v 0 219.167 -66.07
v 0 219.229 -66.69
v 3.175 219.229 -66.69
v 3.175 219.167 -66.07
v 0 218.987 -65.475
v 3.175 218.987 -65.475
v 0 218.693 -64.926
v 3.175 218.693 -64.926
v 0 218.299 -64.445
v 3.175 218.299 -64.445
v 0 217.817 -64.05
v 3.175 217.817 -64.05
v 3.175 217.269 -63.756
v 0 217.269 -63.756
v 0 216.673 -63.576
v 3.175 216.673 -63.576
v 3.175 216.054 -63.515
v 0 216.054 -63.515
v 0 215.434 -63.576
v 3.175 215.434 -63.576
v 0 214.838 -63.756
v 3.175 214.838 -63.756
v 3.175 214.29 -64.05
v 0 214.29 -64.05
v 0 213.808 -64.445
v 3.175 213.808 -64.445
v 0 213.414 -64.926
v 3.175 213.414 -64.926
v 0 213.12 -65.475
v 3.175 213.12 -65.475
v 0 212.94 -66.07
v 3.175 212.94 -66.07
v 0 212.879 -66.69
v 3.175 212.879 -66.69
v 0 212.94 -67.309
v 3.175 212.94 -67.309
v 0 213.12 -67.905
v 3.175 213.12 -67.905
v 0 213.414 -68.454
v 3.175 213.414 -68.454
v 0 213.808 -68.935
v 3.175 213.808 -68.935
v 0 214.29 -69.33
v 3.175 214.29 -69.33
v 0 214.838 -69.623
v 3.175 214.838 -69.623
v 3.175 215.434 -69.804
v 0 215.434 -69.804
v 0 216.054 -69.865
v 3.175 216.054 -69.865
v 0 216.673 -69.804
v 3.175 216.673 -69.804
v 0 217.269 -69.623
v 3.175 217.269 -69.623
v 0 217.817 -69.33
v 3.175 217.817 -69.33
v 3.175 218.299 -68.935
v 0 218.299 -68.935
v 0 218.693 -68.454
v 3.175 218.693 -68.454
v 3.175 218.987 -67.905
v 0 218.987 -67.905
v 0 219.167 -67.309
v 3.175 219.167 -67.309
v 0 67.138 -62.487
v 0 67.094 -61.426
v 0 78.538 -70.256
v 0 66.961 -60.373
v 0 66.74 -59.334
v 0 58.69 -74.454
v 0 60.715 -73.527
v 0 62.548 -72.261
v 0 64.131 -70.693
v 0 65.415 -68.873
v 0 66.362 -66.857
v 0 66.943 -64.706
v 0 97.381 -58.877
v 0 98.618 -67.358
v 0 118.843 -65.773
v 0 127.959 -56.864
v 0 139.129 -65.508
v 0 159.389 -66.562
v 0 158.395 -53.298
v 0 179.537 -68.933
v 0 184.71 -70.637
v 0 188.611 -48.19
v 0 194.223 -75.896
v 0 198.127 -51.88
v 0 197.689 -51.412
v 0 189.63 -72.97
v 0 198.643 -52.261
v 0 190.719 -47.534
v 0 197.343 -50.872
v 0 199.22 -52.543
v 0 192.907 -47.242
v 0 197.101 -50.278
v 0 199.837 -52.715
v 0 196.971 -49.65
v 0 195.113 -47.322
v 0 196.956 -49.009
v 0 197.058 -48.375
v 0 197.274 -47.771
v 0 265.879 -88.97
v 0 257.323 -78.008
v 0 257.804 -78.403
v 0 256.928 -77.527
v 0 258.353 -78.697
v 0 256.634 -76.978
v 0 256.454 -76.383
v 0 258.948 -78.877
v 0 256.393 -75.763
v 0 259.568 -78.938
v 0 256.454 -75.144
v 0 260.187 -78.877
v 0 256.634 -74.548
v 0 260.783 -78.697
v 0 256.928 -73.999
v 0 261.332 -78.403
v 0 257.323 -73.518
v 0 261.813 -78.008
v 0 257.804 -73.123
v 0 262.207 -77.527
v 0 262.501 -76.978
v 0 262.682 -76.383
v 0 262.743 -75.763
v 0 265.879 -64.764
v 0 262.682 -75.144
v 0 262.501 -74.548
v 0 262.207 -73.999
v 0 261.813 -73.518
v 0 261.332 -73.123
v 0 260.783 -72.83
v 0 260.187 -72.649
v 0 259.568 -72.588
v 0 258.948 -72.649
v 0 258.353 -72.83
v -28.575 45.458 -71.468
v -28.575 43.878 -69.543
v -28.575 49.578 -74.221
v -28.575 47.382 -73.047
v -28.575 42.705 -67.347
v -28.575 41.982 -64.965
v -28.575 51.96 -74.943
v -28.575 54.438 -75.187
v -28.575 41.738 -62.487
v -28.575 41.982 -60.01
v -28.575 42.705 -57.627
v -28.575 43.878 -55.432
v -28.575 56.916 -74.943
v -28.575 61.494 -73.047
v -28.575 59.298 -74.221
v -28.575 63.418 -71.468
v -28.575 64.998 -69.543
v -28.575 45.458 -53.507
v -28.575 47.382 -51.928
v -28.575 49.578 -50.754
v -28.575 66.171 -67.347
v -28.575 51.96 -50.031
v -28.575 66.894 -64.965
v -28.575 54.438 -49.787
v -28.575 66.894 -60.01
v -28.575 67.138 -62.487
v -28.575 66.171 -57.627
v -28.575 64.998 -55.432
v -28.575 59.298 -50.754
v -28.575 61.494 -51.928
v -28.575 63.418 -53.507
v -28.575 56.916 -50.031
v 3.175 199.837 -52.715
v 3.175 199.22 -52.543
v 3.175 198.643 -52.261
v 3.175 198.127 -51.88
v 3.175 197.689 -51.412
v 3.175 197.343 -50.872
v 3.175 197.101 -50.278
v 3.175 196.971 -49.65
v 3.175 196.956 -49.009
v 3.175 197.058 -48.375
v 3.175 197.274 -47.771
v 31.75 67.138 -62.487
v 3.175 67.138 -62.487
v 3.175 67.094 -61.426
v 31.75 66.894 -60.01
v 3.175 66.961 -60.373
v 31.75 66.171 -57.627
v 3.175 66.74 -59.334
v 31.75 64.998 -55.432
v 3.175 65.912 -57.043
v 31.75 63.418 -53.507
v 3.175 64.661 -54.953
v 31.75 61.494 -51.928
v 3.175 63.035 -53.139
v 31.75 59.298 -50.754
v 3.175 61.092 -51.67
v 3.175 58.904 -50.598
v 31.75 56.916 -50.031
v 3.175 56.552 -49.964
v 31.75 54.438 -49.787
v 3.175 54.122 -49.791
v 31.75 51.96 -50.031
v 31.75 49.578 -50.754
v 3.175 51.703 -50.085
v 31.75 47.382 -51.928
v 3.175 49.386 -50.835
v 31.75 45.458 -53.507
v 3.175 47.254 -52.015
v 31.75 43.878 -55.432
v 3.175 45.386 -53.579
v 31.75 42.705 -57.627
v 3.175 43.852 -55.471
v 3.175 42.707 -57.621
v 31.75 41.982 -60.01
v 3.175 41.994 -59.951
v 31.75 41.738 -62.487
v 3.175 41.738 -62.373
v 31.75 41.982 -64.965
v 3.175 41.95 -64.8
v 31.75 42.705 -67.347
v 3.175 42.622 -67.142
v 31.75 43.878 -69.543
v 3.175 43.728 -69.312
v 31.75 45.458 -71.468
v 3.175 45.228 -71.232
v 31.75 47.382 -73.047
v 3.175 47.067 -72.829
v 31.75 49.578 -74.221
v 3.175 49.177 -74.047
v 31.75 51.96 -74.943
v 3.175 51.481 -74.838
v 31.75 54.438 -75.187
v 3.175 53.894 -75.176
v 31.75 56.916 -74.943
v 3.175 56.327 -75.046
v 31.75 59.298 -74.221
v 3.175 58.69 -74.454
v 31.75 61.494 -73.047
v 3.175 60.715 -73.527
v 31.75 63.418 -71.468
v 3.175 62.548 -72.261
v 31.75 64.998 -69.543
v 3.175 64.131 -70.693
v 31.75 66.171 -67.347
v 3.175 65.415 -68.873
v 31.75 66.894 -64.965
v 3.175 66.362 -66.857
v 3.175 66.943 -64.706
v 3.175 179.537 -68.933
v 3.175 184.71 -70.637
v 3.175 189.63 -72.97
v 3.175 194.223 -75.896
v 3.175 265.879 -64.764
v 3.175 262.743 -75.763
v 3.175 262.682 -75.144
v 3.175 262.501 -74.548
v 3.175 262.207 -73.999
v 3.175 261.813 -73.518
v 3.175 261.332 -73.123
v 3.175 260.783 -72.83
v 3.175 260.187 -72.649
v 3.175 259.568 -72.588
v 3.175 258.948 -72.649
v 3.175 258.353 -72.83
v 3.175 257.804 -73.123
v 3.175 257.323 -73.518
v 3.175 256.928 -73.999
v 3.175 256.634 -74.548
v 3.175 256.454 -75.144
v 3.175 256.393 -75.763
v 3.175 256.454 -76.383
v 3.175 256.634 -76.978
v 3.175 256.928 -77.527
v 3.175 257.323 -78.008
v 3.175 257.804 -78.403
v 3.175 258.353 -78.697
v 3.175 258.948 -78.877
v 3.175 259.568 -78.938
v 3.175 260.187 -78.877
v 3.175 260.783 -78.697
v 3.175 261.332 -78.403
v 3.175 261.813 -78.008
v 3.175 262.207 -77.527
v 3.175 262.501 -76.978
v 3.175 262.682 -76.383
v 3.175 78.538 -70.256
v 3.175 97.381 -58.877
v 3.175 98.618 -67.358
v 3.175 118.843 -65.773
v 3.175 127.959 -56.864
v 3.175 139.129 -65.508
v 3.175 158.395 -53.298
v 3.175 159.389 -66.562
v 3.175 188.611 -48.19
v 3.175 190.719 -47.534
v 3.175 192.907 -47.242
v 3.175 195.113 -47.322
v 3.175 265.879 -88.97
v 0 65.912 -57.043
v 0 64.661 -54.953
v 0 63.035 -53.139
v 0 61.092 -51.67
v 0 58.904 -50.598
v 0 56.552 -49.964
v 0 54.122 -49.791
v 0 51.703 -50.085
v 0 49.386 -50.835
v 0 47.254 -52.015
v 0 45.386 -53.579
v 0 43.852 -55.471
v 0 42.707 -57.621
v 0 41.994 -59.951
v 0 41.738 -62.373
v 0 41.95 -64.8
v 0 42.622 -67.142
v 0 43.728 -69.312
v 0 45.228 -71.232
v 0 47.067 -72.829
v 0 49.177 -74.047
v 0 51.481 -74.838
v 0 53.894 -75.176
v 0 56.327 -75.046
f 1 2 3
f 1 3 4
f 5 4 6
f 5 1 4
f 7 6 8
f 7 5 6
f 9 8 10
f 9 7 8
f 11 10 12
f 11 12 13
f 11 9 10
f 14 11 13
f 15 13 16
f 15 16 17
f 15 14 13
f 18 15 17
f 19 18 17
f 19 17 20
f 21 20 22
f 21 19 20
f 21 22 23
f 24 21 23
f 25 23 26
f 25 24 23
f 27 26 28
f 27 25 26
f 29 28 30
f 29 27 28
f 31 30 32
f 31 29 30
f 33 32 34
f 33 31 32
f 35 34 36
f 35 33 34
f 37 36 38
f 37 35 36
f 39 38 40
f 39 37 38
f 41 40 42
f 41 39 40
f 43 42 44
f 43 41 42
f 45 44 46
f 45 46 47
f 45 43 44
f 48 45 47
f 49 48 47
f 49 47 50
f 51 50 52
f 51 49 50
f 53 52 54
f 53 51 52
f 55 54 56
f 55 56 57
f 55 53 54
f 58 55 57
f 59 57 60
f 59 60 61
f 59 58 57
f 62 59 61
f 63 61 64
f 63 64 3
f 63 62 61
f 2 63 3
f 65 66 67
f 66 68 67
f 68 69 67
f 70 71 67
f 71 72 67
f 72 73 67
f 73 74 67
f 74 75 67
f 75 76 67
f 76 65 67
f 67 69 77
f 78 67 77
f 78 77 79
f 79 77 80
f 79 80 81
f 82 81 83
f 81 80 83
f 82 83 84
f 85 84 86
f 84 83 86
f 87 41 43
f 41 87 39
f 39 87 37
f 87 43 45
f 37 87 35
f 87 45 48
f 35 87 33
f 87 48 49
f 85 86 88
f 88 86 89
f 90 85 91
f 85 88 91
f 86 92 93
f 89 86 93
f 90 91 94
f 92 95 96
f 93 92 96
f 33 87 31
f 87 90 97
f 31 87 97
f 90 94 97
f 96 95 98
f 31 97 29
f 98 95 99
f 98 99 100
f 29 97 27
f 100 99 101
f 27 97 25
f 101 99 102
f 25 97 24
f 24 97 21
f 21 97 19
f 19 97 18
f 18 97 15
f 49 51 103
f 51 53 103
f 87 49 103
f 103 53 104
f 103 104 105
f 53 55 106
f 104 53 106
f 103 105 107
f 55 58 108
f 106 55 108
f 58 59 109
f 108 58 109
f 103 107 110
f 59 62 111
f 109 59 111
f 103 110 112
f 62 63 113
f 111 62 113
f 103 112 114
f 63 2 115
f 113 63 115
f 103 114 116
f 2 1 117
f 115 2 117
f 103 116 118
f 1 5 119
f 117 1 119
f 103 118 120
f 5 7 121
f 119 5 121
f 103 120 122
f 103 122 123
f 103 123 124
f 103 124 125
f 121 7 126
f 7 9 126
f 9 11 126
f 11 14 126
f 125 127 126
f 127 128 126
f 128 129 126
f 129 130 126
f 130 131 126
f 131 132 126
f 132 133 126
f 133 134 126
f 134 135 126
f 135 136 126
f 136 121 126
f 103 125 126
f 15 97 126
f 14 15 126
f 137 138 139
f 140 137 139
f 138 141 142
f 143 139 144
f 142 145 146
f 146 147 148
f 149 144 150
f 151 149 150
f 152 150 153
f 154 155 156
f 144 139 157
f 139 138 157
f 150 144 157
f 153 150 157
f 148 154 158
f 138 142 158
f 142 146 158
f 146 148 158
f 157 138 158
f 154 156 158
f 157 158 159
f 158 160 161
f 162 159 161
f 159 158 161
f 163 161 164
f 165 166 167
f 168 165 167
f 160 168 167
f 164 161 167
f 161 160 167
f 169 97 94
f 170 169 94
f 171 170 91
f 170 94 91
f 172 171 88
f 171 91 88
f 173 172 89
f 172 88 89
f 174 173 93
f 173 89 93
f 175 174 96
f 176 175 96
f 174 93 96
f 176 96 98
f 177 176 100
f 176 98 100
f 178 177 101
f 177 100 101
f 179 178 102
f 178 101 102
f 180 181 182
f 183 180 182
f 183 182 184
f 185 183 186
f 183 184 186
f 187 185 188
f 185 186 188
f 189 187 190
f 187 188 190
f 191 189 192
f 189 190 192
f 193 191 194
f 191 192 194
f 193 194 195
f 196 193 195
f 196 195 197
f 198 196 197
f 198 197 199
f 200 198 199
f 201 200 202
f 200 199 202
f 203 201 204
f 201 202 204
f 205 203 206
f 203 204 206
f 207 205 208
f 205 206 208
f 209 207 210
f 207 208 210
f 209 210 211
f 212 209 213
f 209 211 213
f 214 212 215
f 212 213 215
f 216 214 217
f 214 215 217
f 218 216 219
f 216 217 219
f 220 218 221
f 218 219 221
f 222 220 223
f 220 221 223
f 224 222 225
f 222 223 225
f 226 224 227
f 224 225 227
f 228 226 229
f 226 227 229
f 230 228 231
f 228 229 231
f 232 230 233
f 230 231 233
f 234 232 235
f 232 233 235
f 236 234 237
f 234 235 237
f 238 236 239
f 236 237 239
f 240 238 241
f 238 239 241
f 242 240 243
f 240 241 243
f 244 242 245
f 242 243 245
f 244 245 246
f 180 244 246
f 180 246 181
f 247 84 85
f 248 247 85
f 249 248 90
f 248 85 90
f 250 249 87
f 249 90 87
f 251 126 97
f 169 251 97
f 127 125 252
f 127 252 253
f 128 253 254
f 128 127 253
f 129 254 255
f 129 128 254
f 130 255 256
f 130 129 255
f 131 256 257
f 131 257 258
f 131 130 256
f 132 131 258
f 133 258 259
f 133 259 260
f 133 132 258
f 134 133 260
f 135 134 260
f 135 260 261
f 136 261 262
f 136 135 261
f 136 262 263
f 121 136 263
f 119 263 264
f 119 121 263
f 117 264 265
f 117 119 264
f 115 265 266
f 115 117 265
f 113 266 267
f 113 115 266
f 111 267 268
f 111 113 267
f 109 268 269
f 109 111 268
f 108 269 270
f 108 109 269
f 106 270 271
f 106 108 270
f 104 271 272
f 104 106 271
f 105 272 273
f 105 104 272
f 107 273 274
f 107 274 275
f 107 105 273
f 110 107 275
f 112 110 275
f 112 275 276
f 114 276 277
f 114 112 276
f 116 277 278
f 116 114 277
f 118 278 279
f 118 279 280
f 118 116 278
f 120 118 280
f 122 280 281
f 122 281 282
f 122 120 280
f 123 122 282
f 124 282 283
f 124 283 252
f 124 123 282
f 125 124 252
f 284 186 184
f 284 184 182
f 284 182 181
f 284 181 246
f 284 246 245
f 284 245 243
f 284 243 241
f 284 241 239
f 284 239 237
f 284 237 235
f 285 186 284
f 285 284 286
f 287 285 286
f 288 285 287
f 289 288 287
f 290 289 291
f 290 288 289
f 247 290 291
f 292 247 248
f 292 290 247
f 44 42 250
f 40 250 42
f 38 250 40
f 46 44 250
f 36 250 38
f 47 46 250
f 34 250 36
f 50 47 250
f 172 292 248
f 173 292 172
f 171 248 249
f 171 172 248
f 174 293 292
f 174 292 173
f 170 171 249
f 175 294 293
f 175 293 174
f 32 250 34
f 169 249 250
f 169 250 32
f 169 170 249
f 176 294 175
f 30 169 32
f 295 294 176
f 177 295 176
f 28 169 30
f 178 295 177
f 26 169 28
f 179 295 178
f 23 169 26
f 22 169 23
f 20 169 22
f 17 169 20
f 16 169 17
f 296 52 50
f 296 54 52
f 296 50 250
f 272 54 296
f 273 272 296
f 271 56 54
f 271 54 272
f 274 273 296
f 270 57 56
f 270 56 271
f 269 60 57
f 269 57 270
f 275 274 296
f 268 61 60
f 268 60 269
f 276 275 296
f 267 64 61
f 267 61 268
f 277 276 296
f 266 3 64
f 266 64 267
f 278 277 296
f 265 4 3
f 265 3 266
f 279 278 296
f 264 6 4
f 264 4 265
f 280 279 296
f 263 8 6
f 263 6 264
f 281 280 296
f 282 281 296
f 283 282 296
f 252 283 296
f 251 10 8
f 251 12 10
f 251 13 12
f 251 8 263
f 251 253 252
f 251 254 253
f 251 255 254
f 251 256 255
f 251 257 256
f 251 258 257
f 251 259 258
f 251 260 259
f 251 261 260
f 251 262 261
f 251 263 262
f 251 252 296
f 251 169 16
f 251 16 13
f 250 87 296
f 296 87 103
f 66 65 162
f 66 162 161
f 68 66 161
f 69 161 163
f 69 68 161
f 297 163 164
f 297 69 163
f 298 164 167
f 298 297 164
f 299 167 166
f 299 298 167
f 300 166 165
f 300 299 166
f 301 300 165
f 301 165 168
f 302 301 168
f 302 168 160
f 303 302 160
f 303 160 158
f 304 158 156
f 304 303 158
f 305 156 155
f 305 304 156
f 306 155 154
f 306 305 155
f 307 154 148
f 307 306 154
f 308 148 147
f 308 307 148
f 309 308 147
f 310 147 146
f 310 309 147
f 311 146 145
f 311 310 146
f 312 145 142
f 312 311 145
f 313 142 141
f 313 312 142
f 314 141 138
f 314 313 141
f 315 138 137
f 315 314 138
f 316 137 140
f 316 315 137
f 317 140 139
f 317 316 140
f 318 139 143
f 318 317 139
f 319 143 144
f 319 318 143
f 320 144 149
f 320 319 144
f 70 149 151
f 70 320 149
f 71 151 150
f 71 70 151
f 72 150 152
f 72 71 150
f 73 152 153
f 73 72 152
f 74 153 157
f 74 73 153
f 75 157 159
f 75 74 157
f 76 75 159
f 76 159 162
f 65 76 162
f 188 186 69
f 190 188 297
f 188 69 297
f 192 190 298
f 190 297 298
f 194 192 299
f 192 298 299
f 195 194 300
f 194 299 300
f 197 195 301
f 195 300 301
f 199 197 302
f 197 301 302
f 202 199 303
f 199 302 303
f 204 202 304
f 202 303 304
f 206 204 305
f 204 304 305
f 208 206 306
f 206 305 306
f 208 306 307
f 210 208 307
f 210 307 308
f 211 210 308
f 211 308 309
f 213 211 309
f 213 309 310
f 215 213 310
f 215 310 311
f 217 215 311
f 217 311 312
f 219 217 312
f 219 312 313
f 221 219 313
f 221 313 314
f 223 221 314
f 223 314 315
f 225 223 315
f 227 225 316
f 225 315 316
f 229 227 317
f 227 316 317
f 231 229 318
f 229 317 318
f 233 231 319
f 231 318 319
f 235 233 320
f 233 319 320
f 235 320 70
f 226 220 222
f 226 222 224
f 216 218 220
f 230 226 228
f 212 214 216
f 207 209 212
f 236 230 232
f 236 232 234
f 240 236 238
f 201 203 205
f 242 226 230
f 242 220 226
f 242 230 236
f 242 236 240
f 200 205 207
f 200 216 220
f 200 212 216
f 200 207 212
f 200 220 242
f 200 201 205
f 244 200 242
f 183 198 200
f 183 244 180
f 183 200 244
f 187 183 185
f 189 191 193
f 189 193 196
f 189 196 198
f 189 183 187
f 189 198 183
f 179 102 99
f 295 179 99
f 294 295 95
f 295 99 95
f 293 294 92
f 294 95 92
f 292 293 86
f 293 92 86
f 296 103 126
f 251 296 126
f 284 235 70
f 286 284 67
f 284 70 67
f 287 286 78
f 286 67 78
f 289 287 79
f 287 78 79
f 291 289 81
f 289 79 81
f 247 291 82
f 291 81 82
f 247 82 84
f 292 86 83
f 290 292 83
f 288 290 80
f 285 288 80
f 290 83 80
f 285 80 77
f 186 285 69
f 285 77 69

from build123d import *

# Parameters (mm, degrees)
F0_R          = 4.7625
F0_R_2        = 3.175
F1_DEPTH      = 3.175
F2_R          = 12.7
F3_DEPTH      = 31.75
F3_DEPTH_BACK = 28.575


with BuildPart() as f1:
    # F0 (on Right) → F1 (new body)
    with BuildSketch(Plane.YZ):
        with BuildLine():
            Line((194.222937, -75.896066), (199.837454, -52.714848))
            ThreePointArc((199.837454, -52.714848), (197.343361, -50.871673), (197.273806, -47.771197))
            ThreePointArc((197.273806, -47.771197), (192.906665, -47.242193), (188.611001, -48.190366))
            ThreePointArc((188.611001, -48.190366), (127.959227, -56.863753), (66.740255, -59.334101))
            ThreePointArc((66.740255, -59.334101), (43.22785, -56.518652), (58.68969, -74.45441))
            ThreePointArc((58.68969, -74.45441), (118.843076, -65.773207), (179.537445, -68.93336))
            ThreePointArc((179.537445, -68.93336), (187.206277, -71.726944), (194.222937, -75.896066))
        make_face()
        with Locations((54.437917, -62.487271)):
            Circle(F0_R, mode=Mode.SUBTRACT)
        Polygon((265.879052, -64.764367), (199.837454, -52.714848), (194.222937, -75.896066), (265.879052, -88.969973), align=None)
        with Locations((259.567566, -75.763282)):
            Circle(F0_R_2, mode=Mode.SUBTRACT)
        with Locations((216.053504, -66.689754)):
            Circle(F0_R_2, mode=Mode.SUBTRACT)
    extrude(amount=F1_DEPTH)

    # F2 (on Right) → F3 (join, two sides)
    with BuildSketch(Plane.YZ) as f3_sk:
        with Locations((54.437917, -62.487271)):
            Circle(F2_R)
    extrude(amount=F3_DEPTH)
    extrude(f3_sk.sketch, amount=-F3_DEPTH_BACK)


solid = f1.part
